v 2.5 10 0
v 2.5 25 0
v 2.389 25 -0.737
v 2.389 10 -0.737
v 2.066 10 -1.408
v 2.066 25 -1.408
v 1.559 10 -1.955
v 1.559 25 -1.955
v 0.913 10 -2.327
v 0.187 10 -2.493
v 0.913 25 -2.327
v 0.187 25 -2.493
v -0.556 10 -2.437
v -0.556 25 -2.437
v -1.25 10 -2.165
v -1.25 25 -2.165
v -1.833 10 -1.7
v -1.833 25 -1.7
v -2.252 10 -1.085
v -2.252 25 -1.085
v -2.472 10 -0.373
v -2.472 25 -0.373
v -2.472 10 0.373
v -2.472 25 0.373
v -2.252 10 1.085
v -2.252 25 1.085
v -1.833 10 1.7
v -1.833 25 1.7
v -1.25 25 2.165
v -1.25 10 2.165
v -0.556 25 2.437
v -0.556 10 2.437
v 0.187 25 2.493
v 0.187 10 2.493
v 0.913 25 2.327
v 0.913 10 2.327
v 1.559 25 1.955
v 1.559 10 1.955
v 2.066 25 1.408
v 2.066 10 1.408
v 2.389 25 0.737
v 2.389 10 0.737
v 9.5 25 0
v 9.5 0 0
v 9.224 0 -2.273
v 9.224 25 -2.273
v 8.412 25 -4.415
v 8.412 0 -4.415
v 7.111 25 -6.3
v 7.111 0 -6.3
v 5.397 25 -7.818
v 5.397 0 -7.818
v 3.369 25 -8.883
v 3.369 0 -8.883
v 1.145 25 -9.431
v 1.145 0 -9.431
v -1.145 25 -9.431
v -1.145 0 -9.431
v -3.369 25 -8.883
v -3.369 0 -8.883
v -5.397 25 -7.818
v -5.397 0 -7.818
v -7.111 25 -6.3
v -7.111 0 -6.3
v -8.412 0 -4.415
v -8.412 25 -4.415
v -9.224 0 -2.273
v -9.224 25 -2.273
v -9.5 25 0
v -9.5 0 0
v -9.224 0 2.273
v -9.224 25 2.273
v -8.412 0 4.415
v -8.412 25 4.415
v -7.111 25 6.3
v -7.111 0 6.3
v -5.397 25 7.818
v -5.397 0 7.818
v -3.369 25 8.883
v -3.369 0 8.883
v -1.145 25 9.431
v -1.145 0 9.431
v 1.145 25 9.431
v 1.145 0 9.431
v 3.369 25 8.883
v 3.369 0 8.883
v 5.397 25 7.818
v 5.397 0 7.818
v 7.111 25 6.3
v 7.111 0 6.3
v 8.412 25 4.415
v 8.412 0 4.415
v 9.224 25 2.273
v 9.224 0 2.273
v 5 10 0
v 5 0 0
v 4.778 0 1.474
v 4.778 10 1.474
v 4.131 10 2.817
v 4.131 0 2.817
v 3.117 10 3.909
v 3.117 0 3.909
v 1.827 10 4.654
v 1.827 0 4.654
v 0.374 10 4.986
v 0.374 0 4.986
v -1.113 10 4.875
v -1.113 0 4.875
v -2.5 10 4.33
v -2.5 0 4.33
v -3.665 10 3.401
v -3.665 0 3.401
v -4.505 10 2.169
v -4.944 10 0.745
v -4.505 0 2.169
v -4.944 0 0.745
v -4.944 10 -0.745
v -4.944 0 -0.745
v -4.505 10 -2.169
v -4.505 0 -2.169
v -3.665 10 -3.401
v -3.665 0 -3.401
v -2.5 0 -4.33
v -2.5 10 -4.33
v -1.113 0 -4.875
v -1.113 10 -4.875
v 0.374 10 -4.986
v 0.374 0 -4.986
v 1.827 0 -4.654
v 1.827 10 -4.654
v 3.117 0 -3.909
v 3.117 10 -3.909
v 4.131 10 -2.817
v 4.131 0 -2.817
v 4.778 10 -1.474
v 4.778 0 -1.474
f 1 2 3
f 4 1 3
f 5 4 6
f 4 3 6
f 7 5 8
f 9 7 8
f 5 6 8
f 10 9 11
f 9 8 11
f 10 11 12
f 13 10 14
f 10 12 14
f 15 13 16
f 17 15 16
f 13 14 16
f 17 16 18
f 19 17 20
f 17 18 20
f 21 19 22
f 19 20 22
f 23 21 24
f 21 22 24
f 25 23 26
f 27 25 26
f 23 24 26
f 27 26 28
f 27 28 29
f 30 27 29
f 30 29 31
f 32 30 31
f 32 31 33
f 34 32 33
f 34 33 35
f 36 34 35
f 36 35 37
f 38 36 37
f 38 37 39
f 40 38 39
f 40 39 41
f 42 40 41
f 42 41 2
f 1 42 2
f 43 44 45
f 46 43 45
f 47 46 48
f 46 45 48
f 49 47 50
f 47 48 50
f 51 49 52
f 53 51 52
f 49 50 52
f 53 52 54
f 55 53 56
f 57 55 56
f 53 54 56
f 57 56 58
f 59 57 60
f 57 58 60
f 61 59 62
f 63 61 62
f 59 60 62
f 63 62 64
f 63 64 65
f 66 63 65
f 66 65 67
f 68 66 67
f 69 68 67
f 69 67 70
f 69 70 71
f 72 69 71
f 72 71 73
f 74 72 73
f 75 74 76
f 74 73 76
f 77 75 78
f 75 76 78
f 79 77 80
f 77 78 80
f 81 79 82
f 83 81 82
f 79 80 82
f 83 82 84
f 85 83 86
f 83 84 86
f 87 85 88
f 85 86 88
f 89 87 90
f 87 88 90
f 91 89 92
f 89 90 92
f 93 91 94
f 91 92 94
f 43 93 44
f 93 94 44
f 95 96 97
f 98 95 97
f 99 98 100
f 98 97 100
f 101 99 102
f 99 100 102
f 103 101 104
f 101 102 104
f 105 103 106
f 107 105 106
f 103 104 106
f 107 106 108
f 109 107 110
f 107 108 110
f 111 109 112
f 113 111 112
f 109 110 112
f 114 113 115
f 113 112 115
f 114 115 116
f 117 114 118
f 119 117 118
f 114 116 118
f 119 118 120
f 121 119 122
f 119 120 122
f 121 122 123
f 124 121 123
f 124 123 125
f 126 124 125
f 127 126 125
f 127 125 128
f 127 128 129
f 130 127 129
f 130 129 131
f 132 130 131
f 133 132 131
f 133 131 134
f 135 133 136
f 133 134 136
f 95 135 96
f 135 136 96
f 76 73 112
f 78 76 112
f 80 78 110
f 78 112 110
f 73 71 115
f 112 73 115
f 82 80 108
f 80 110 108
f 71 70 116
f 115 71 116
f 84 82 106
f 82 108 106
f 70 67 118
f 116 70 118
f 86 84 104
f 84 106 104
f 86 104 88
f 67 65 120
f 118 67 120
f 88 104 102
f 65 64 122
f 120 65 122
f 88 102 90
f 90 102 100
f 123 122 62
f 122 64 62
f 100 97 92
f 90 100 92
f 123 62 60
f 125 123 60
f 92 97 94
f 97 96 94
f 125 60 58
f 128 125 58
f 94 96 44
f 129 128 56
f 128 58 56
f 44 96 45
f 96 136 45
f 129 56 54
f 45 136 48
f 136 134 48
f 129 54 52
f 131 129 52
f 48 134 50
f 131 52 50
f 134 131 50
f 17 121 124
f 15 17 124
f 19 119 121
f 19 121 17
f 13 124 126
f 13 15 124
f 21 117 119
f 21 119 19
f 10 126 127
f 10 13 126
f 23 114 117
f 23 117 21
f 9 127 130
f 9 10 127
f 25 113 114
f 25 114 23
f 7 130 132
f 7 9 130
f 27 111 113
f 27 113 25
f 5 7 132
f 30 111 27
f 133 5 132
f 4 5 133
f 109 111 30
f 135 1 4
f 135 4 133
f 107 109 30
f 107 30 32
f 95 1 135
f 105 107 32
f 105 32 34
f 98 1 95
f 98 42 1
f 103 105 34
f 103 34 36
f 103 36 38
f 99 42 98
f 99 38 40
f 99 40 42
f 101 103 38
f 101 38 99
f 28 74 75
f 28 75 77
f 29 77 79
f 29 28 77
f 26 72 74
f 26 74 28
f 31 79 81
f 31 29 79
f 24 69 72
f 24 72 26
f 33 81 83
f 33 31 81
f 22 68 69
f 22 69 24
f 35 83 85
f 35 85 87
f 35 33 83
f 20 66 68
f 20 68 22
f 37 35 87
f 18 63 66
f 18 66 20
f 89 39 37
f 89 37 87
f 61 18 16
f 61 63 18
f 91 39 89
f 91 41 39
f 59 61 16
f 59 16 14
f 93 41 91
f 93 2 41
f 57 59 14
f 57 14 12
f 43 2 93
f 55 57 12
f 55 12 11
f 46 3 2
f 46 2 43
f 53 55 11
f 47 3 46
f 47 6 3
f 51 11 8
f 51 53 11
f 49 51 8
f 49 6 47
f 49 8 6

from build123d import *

# Parameters (mm, degrees)
SKETCH1_R           = 9.5
BOSS_EXTRUDE1_DEPTH = 25
SKETCH2_R           = 5
CUT_EXTRUDE1_DEPTH  = 10
SKETCH3_R           = 2.5
CUT_EXTRUDE2_DEPTH  = 26


with BuildPart() as part:
    # Sketch1 → Boss-Extrude1 (new body)
    with BuildSketch(Plane(origin=(0, 0, 0), x_dir=(1, 0, 0), z_dir=(0, 1, 0))):
        Circle(SKETCH1_R)
    extrude(amount=BOSS_EXTRUDE1_DEPTH)

    # Sketch2 → Cut-Extrude1 (cut)
    with BuildSketch(Plane.XZ):
        Circle(SKETCH2_R)
    extrude(amount=-CUT_EXTRUDE1_DEPTH, mode=Mode.SUBTRACT)

    # Sketch3 → Cut-Extrude2 (cut, through all)
    with BuildSketch(Plane(origin=(0, 25, 0), x_dir=(1, 0, 0), z_dir=(0, 1, 0))):
        Circle(SKETCH3_R)
    extrude(amount=-CUT_EXTRUDE2_DEPTH, mode=Mode.SUBTRACT)


solid = part.part
